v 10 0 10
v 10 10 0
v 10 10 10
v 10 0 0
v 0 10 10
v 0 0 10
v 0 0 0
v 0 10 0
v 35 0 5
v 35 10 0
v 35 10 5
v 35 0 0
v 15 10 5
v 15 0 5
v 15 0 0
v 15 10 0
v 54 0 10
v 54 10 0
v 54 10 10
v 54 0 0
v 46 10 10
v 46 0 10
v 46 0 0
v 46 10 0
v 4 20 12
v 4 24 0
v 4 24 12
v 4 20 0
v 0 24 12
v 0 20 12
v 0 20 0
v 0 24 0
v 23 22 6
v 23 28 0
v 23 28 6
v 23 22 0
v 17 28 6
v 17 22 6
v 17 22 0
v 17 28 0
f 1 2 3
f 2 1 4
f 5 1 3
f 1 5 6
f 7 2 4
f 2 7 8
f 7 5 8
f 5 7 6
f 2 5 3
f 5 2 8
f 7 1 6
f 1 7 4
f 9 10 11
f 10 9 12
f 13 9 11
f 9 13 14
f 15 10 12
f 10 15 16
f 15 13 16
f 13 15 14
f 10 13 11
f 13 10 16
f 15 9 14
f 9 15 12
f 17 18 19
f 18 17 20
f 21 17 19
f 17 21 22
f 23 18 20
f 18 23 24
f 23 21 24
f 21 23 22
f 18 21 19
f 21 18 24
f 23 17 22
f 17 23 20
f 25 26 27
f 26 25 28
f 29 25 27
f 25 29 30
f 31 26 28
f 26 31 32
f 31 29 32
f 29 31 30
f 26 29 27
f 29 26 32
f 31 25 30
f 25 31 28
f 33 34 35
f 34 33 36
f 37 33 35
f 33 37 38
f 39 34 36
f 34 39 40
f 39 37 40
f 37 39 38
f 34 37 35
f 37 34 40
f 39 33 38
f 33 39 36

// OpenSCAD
// Purpose: cube in all forms – number, vector, center = true/false, positional arguments.
cube(10);
translate([15, 0, 0]) cube([20, 10, 5]);
translate([50, 5, 5]) cube([8, 10, 10], center = true);
translate([0, 20, 0]) cube(size = [4, 4, 12], center = false);
translate([20, 25, 3]) cube(6, true);
